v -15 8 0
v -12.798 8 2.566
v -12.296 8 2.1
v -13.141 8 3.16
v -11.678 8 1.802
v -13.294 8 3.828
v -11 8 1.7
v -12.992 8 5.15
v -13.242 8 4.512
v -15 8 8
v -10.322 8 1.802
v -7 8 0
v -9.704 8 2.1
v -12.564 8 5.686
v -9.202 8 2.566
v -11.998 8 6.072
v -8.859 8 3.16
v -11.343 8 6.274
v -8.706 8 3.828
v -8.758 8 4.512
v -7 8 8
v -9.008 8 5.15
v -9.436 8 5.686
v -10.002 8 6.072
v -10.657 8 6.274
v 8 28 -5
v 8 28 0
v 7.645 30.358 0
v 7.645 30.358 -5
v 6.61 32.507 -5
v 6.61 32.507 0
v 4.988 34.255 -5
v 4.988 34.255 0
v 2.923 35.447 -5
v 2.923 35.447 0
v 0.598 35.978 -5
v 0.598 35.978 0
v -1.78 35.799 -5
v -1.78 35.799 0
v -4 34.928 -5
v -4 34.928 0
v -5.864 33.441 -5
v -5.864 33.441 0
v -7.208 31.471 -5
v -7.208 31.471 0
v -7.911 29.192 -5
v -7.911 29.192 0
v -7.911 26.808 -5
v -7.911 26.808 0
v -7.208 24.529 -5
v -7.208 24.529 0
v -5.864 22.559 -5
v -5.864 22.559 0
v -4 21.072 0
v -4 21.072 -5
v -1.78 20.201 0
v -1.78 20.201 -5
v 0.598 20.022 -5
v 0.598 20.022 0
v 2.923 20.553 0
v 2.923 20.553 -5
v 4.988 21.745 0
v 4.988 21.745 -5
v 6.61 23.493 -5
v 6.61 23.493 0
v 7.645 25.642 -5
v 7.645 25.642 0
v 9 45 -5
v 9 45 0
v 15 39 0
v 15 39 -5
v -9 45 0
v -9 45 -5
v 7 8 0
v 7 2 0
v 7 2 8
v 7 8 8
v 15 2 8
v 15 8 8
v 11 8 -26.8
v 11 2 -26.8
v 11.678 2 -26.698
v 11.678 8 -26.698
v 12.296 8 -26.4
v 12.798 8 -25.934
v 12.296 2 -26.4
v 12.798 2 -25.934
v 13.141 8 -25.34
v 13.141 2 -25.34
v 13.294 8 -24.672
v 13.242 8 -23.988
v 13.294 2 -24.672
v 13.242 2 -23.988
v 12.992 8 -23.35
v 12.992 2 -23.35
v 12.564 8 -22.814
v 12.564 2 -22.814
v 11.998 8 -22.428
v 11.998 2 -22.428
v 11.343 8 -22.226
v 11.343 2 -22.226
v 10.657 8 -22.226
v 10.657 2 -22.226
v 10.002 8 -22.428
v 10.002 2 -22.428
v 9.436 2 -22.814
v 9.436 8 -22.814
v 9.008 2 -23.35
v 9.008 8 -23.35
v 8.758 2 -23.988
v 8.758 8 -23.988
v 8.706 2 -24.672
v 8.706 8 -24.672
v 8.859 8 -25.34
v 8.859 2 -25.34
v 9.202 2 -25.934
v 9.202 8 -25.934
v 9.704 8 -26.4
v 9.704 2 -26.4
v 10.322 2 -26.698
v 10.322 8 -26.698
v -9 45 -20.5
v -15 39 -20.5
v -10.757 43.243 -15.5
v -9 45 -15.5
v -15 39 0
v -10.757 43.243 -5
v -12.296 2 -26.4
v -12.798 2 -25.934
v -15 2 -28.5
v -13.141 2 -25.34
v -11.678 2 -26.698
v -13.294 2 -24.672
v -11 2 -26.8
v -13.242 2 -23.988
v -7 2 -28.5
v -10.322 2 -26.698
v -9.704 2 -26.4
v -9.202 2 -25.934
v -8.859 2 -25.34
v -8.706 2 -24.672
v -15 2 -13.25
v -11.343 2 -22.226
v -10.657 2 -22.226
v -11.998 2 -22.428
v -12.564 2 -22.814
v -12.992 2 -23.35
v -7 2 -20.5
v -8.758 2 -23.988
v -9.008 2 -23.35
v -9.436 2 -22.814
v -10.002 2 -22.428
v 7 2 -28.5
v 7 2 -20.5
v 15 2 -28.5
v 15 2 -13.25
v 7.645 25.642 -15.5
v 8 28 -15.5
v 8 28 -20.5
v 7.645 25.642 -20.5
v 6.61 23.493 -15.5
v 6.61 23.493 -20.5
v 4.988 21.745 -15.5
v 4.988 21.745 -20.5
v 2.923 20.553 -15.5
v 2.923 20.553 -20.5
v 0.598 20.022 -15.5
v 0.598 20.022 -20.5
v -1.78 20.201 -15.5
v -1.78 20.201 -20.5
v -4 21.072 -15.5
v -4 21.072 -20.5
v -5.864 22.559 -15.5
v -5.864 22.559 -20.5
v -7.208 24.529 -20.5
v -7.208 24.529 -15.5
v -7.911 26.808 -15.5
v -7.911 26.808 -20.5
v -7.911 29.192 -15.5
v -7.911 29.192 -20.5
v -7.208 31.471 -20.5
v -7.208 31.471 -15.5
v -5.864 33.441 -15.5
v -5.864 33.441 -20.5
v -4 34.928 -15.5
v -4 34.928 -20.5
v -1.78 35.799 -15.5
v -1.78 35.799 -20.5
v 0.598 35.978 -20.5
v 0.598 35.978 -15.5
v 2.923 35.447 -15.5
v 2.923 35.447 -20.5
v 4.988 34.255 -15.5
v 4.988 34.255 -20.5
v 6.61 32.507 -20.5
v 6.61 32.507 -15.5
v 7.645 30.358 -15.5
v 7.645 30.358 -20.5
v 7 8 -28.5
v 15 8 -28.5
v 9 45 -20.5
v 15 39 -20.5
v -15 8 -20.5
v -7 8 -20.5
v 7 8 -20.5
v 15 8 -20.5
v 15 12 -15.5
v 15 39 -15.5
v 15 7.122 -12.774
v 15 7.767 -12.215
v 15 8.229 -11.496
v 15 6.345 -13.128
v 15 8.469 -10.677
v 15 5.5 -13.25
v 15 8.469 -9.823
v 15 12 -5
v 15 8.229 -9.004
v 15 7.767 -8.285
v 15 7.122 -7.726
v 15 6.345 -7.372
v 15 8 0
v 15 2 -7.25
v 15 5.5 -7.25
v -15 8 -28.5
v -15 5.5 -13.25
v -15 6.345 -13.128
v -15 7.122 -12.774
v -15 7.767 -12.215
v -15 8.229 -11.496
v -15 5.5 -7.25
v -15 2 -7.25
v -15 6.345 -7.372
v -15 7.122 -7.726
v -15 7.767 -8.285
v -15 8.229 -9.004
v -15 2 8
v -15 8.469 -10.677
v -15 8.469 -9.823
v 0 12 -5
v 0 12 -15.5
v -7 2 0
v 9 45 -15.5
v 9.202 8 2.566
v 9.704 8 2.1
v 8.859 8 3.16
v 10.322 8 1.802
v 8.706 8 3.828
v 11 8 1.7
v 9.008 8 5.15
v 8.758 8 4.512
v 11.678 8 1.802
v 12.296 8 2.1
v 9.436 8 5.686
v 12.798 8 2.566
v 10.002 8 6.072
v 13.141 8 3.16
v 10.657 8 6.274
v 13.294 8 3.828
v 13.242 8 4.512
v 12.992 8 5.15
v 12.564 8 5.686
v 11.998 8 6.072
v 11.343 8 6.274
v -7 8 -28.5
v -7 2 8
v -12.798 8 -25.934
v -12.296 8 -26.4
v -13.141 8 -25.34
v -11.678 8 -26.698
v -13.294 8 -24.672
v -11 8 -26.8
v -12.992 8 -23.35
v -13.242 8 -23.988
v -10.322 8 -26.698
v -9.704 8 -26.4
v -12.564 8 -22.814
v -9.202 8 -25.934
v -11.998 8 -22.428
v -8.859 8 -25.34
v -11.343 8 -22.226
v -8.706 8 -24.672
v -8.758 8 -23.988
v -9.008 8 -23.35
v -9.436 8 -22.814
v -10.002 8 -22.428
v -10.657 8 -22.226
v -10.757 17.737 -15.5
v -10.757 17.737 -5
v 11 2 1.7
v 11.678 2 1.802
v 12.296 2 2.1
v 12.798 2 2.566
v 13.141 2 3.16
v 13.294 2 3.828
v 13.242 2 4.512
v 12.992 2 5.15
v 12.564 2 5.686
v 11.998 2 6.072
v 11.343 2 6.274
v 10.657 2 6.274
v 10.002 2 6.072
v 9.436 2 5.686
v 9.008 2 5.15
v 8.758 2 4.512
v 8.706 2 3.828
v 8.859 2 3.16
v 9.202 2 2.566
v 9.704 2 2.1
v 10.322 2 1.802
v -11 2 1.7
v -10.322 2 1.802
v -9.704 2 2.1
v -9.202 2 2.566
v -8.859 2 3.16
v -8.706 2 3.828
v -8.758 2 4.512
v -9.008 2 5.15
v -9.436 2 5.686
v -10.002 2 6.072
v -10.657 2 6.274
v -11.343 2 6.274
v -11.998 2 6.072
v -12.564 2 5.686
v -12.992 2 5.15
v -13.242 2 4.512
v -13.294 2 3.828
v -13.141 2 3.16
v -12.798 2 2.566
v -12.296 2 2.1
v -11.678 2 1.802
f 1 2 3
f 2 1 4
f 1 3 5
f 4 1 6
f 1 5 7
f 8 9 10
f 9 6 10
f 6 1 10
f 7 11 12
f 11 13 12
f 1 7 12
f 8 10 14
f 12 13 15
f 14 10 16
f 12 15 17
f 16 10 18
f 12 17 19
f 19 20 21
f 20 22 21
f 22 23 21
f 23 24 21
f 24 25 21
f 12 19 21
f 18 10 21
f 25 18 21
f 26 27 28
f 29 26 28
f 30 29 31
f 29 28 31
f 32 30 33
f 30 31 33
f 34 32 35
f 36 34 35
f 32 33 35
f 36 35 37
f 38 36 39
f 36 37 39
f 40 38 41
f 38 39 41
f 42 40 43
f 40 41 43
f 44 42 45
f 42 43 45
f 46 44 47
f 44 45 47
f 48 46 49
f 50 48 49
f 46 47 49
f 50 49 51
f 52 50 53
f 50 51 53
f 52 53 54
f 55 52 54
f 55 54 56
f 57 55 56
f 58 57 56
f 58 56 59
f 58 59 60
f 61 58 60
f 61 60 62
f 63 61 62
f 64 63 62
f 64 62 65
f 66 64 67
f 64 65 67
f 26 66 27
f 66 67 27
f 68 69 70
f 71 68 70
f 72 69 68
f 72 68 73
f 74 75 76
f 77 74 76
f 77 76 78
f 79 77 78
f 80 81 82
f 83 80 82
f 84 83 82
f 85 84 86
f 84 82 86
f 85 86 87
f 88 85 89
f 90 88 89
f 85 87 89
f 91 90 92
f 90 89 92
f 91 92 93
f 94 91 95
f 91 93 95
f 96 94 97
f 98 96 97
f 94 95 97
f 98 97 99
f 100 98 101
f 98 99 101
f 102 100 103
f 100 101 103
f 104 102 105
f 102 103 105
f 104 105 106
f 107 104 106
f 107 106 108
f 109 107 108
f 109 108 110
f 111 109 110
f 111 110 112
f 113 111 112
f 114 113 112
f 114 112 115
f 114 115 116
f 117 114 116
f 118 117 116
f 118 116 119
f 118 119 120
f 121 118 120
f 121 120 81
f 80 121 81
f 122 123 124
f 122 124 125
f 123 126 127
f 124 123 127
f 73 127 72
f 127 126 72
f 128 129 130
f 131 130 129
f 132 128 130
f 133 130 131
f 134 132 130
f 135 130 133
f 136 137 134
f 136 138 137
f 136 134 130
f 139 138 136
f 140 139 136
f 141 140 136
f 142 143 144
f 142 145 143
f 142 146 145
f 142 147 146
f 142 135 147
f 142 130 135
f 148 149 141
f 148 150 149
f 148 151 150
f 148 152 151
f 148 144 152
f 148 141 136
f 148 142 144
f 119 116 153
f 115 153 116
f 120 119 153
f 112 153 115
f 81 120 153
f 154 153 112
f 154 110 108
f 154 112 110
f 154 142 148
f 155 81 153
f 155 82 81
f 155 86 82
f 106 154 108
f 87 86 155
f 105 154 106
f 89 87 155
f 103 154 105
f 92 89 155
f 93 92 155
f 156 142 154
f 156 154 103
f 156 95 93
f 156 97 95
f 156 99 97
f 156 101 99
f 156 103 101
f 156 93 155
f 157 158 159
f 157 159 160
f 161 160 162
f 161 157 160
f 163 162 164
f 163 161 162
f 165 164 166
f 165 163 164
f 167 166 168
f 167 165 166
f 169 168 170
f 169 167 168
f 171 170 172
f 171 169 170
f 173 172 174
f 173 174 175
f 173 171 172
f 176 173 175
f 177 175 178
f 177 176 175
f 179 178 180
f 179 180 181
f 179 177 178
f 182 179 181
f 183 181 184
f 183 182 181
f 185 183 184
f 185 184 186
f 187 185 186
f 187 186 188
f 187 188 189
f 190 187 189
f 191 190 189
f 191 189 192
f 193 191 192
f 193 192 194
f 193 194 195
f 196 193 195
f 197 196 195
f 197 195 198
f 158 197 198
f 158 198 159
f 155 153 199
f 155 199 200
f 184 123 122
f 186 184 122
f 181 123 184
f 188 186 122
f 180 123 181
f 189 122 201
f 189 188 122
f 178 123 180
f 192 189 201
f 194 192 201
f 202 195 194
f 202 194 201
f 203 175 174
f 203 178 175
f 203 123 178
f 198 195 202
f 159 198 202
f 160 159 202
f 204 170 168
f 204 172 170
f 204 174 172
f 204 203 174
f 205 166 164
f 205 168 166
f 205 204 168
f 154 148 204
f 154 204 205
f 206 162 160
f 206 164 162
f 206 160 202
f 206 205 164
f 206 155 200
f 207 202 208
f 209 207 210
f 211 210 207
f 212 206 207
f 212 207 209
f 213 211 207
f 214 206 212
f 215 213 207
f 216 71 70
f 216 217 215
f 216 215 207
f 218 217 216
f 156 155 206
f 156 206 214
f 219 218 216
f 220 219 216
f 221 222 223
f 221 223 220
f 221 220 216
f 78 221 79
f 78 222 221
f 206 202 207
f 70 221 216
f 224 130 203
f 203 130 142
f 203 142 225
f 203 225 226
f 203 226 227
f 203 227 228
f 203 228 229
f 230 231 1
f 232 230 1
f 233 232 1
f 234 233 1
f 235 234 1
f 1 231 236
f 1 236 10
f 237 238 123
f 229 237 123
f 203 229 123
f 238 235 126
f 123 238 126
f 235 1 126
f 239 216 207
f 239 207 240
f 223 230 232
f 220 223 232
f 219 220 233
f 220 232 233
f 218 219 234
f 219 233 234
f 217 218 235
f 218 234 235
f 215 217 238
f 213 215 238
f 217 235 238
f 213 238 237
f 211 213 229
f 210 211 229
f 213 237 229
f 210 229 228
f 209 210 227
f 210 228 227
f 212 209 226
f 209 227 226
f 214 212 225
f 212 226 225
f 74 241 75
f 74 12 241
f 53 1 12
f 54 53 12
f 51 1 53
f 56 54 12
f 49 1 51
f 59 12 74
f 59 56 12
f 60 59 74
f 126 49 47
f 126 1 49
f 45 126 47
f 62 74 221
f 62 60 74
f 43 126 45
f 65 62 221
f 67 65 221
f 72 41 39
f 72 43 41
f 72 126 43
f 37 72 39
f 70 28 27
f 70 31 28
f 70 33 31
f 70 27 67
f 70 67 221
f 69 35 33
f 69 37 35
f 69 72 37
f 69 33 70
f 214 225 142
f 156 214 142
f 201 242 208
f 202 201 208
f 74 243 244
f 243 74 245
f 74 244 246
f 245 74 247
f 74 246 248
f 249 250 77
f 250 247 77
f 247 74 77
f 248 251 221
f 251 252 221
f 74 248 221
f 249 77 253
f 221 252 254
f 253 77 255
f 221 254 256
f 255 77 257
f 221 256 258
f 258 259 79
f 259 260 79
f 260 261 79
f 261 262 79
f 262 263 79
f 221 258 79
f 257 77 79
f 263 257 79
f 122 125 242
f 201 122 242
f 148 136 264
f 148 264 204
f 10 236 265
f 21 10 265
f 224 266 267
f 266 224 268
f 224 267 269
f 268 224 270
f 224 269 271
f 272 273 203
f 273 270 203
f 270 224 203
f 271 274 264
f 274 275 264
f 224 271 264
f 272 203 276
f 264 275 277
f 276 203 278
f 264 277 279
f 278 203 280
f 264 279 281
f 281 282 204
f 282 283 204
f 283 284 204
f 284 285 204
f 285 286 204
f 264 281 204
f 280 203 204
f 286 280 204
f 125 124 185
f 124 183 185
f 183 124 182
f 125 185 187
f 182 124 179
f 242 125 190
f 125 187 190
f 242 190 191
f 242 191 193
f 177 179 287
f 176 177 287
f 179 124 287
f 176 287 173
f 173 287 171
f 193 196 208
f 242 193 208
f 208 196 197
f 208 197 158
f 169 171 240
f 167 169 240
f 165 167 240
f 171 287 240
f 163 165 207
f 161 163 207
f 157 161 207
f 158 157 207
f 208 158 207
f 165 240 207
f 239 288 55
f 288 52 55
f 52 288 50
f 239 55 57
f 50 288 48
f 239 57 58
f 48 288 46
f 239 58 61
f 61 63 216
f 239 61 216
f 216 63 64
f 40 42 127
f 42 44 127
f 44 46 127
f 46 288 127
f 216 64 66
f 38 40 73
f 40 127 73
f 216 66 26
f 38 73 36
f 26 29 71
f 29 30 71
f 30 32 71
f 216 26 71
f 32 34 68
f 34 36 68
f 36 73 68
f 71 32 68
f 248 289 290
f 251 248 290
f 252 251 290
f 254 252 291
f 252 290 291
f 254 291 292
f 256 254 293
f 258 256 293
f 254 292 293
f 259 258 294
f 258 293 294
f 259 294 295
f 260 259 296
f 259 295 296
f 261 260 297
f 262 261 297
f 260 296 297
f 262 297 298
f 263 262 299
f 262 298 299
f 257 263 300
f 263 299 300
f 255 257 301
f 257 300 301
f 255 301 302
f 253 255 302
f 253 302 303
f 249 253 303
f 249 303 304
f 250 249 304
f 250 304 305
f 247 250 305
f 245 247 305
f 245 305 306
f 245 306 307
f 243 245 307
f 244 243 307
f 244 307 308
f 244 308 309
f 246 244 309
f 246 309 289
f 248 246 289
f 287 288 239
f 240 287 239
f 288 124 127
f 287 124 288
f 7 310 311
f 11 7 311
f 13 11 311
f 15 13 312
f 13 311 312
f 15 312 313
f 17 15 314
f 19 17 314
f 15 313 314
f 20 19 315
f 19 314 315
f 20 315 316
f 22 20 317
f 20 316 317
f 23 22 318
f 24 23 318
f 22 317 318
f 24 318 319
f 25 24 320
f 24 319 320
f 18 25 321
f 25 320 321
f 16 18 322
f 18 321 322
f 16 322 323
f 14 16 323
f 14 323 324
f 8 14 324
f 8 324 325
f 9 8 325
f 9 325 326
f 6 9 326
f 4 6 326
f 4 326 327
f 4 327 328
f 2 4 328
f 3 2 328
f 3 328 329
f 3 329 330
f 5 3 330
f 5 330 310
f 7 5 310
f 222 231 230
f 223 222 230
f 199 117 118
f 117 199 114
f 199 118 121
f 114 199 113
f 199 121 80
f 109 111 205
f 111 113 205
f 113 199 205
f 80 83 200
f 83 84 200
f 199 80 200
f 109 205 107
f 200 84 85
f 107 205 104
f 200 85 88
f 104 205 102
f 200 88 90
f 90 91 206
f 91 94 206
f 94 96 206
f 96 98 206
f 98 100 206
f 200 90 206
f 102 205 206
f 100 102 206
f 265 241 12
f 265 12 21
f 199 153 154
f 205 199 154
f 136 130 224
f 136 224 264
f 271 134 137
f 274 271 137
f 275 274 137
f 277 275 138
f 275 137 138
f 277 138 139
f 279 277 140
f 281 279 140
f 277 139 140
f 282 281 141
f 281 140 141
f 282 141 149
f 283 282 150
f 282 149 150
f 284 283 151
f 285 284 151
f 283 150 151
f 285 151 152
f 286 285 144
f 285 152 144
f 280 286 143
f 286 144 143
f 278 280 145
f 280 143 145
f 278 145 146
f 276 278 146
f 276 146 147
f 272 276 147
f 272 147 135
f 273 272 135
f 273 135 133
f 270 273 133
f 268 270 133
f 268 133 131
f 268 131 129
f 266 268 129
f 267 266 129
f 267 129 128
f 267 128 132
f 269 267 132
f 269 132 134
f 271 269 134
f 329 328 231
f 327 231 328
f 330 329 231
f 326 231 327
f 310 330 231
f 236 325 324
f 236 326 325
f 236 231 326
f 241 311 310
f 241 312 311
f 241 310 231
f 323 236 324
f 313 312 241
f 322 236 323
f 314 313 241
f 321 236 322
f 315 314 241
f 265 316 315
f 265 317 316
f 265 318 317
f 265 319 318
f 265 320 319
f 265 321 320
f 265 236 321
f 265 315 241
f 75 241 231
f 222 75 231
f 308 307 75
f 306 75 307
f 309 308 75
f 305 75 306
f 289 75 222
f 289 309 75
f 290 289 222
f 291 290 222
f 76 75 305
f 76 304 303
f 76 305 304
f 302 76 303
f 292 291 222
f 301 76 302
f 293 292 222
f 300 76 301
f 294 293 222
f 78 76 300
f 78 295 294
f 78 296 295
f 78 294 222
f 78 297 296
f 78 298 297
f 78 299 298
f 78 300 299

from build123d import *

# Parameters (mm, degrees)
ESQUISSE1_R             = 8
BOSS_EXTRU_1_DEPTH      = 5
ESQUISSE2_W             = 30
ESQUISSE2_H             = 12
BOSS_EXTRU_2_DEPTH      = 10.5
ESQUISSE4_W             = 30
ESQUISSE4_H             = 5
BOSS_EXTRU_3_DEPTH      = 45
ENL_V_START             = -10
ESQUISSE6_R             = 8
ENL_V_MAT_EXTRU_3_DEPTH = 10
ESQUISSE8_W             = 8
ESQUISSE8_H             = 8
ESQUISSE8_R             = 2.3
BOSS_EXTRU_4_DEPTH      = 8
ENL_V_MAT_EXTRU_4_DEPTH = 2
ENL_V_MAT_EXTRU_5_DEPTH = 50
ENL_V_MAT_EXTRU_6_DEPTH = 50
BOSS_EXTRU_5_DEPTH      = 10.5
BOSS_EXTRU_7_DEPTH      = 15


with BuildPart() as part:
    # Esquisse1 → Boss.-Extru.1 (new body)
    with BuildSketch(Plane.XY):
        Polygon((0, 0), (15, 0), (15, 45), (-15, 45), (-15, 0), align=None)
        with Locations((0, 28)):
            Circle(ESQUISSE1_R, mode=Mode.SUBTRACT)
    extrude(amount=-BOSS_EXTRU_1_DEPTH)

    # Esquisse2 → Boss.-Extru.2 (add)
    with BuildSketch(Plane(origin=(0, 0, -5), x_dir=(-1, 0, 0), z_dir=(0, 0, -1))):
        with Locations((0, 6)):
            Rectangle(ESQUISSE2_W, ESQUISSE2_H)
    extrude(amount=BOSS_EXTRU_2_DEPTH)

    # Esquisse4 → Boss.-Extru.3 (add)
    with BuildSketch(Plane.XZ):
        with Locations((0, -18)):
            Rectangle(ESQUISSE4_W, ESQUISSE4_H)
    extrude(amount=-BOSS_EXTRU_3_DEPTH)

    # Esquisse6 → Enlèv. mat.-Extru.3 (cut)
    with BuildSketch(Plane(origin=(0, 0, -20.5), x_dir=(-1, 0, 0), z_dir=(0, 0, -1)).offset(ENL_V_START)):
        with Locations(Location((0, 28, 0), (0, 0, 180))):
            Circle(ESQUISSE6_R)
    extrude(amount=ENL_V_MAT_EXTRU_3_DEPTH, mode=Mode.SUBTRACT)

    # Esquisse8 → Boss.-Extru.4 (add)
    # profile 1 of 4: a face of its own
    with BuildSketch(Plane.XZ):
        with Locations((-11, 4)):
            Rectangle(ESQUISSE8_W, ESQUISSE8_H)
        with Locations(Location((-11, 4, 0), (0, 0, 270))):
            Circle(ESQUISSE8_R, mode=Mode.SUBTRACT)
    # profile 2 of 4: a face of its own
    with BuildSketch(Plane.XZ):
        with Locations((11, 4)):
            Rectangle(ESQUISSE8_W, ESQUISSE8_H)
        with Locations(Location((11, 4, 0), (0, 0, 270))):
            Circle(ESQUISSE8_R, mode=Mode.SUBTRACT)
    # profile 3 of 4: a face of its own
    with BuildSketch(Plane.XZ):
        with Locations((-11, -24.5)):
            Rectangle(ESQUISSE8_W, ESQUISSE8_H)
        with Locations(Location((-11, -24.5, 0), (0, 0, 270))):
            Circle(ESQUISSE8_R, mode=Mode.SUBTRACT)
    # profile 4 of 4: a face of its own
    with BuildSketch(Plane.XZ):
        with Locations((11, -24.5)):
            Rectangle(ESQUISSE8_W, ESQUISSE8_H)
        with Locations(Location((11, -24.5, 0), (0, 0, 270))):
            Circle(ESQUISSE8_R, mode=Mode.SUBTRACT)
    extrude(amount=-BOSS_EXTRU_4_DEPTH)

    # Esquisse9 → Enlèv. mat.-Extru.4 (cut)
    with BuildSketch(Plane.XZ):
        Polygon((-15, 8), (-15, -28.5), (-7, -28.5), (-7, -20.5), (7, -20.5), (7, -28.5), (15, -28.5), (15, 8), (7, 8), (7, 0), (-7, 0), (-7, 8), align=None)
    extrude(amount=-ENL_V_MAT_EXTRU_4_DEPTH, mode=Mode.SUBTRACT)

    # Esquisse10 → Enlèv. mat.-Extru.5 (cut)
    with BuildSketch(Plane.ZY.offset(15)):
        with BuildLine():
            Line((-13.25, 2), (-7.25, 2))
            Line((-7.25, 2), (-7.25, 5.5))
            ThreePointArc((-7.25, 5.5), (-10.25, 8.5), (-13.25, 5.5))
            Line((-13.25, 5.5), (-13.25, 2))
        make_face()
    extrude(amount=-ENL_V_MAT_EXTRU_5_DEPTH, mode=Mode.SUBTRACT)

    # Esquisse11 → Enlèv. mat.-Extru.6 (cut)
    with BuildSketch(Plane.XY):
        Polygon((-9, 45), (-15, 45), (-15, 39), align=None)
        Polygon((15, 45), (9, 45), (15, 39), align=None)
    extrude(amount=-ENL_V_MAT_EXTRU_6_DEPTH, mode=Mode.SUBTRACT)

    # Esquisse12 → Boss.-Extru.5 (add)
    with BuildSketch(Plane(origin=(0, 0, -5), x_dir=(-1, 0, 0), z_dir=(0, 0, -1))):
        Polygon((0, 12), (15, 12), (15, 20), align=None)
    extrude(amount=BOSS_EXTRU_5_DEPTH)

    # Esquisse13 → Boss.-Extru.7 (add)
    with BuildSketch(Plane.XY.offset(-15.5)):
        Polygon((-15, 20), (-15, 39), (-10.757359313, 43.242640687), (-10.757359313, 17.084037873), align=None)
    extrude(amount=BOSS_EXTRU_7_DEPTH)


solid = part.part
